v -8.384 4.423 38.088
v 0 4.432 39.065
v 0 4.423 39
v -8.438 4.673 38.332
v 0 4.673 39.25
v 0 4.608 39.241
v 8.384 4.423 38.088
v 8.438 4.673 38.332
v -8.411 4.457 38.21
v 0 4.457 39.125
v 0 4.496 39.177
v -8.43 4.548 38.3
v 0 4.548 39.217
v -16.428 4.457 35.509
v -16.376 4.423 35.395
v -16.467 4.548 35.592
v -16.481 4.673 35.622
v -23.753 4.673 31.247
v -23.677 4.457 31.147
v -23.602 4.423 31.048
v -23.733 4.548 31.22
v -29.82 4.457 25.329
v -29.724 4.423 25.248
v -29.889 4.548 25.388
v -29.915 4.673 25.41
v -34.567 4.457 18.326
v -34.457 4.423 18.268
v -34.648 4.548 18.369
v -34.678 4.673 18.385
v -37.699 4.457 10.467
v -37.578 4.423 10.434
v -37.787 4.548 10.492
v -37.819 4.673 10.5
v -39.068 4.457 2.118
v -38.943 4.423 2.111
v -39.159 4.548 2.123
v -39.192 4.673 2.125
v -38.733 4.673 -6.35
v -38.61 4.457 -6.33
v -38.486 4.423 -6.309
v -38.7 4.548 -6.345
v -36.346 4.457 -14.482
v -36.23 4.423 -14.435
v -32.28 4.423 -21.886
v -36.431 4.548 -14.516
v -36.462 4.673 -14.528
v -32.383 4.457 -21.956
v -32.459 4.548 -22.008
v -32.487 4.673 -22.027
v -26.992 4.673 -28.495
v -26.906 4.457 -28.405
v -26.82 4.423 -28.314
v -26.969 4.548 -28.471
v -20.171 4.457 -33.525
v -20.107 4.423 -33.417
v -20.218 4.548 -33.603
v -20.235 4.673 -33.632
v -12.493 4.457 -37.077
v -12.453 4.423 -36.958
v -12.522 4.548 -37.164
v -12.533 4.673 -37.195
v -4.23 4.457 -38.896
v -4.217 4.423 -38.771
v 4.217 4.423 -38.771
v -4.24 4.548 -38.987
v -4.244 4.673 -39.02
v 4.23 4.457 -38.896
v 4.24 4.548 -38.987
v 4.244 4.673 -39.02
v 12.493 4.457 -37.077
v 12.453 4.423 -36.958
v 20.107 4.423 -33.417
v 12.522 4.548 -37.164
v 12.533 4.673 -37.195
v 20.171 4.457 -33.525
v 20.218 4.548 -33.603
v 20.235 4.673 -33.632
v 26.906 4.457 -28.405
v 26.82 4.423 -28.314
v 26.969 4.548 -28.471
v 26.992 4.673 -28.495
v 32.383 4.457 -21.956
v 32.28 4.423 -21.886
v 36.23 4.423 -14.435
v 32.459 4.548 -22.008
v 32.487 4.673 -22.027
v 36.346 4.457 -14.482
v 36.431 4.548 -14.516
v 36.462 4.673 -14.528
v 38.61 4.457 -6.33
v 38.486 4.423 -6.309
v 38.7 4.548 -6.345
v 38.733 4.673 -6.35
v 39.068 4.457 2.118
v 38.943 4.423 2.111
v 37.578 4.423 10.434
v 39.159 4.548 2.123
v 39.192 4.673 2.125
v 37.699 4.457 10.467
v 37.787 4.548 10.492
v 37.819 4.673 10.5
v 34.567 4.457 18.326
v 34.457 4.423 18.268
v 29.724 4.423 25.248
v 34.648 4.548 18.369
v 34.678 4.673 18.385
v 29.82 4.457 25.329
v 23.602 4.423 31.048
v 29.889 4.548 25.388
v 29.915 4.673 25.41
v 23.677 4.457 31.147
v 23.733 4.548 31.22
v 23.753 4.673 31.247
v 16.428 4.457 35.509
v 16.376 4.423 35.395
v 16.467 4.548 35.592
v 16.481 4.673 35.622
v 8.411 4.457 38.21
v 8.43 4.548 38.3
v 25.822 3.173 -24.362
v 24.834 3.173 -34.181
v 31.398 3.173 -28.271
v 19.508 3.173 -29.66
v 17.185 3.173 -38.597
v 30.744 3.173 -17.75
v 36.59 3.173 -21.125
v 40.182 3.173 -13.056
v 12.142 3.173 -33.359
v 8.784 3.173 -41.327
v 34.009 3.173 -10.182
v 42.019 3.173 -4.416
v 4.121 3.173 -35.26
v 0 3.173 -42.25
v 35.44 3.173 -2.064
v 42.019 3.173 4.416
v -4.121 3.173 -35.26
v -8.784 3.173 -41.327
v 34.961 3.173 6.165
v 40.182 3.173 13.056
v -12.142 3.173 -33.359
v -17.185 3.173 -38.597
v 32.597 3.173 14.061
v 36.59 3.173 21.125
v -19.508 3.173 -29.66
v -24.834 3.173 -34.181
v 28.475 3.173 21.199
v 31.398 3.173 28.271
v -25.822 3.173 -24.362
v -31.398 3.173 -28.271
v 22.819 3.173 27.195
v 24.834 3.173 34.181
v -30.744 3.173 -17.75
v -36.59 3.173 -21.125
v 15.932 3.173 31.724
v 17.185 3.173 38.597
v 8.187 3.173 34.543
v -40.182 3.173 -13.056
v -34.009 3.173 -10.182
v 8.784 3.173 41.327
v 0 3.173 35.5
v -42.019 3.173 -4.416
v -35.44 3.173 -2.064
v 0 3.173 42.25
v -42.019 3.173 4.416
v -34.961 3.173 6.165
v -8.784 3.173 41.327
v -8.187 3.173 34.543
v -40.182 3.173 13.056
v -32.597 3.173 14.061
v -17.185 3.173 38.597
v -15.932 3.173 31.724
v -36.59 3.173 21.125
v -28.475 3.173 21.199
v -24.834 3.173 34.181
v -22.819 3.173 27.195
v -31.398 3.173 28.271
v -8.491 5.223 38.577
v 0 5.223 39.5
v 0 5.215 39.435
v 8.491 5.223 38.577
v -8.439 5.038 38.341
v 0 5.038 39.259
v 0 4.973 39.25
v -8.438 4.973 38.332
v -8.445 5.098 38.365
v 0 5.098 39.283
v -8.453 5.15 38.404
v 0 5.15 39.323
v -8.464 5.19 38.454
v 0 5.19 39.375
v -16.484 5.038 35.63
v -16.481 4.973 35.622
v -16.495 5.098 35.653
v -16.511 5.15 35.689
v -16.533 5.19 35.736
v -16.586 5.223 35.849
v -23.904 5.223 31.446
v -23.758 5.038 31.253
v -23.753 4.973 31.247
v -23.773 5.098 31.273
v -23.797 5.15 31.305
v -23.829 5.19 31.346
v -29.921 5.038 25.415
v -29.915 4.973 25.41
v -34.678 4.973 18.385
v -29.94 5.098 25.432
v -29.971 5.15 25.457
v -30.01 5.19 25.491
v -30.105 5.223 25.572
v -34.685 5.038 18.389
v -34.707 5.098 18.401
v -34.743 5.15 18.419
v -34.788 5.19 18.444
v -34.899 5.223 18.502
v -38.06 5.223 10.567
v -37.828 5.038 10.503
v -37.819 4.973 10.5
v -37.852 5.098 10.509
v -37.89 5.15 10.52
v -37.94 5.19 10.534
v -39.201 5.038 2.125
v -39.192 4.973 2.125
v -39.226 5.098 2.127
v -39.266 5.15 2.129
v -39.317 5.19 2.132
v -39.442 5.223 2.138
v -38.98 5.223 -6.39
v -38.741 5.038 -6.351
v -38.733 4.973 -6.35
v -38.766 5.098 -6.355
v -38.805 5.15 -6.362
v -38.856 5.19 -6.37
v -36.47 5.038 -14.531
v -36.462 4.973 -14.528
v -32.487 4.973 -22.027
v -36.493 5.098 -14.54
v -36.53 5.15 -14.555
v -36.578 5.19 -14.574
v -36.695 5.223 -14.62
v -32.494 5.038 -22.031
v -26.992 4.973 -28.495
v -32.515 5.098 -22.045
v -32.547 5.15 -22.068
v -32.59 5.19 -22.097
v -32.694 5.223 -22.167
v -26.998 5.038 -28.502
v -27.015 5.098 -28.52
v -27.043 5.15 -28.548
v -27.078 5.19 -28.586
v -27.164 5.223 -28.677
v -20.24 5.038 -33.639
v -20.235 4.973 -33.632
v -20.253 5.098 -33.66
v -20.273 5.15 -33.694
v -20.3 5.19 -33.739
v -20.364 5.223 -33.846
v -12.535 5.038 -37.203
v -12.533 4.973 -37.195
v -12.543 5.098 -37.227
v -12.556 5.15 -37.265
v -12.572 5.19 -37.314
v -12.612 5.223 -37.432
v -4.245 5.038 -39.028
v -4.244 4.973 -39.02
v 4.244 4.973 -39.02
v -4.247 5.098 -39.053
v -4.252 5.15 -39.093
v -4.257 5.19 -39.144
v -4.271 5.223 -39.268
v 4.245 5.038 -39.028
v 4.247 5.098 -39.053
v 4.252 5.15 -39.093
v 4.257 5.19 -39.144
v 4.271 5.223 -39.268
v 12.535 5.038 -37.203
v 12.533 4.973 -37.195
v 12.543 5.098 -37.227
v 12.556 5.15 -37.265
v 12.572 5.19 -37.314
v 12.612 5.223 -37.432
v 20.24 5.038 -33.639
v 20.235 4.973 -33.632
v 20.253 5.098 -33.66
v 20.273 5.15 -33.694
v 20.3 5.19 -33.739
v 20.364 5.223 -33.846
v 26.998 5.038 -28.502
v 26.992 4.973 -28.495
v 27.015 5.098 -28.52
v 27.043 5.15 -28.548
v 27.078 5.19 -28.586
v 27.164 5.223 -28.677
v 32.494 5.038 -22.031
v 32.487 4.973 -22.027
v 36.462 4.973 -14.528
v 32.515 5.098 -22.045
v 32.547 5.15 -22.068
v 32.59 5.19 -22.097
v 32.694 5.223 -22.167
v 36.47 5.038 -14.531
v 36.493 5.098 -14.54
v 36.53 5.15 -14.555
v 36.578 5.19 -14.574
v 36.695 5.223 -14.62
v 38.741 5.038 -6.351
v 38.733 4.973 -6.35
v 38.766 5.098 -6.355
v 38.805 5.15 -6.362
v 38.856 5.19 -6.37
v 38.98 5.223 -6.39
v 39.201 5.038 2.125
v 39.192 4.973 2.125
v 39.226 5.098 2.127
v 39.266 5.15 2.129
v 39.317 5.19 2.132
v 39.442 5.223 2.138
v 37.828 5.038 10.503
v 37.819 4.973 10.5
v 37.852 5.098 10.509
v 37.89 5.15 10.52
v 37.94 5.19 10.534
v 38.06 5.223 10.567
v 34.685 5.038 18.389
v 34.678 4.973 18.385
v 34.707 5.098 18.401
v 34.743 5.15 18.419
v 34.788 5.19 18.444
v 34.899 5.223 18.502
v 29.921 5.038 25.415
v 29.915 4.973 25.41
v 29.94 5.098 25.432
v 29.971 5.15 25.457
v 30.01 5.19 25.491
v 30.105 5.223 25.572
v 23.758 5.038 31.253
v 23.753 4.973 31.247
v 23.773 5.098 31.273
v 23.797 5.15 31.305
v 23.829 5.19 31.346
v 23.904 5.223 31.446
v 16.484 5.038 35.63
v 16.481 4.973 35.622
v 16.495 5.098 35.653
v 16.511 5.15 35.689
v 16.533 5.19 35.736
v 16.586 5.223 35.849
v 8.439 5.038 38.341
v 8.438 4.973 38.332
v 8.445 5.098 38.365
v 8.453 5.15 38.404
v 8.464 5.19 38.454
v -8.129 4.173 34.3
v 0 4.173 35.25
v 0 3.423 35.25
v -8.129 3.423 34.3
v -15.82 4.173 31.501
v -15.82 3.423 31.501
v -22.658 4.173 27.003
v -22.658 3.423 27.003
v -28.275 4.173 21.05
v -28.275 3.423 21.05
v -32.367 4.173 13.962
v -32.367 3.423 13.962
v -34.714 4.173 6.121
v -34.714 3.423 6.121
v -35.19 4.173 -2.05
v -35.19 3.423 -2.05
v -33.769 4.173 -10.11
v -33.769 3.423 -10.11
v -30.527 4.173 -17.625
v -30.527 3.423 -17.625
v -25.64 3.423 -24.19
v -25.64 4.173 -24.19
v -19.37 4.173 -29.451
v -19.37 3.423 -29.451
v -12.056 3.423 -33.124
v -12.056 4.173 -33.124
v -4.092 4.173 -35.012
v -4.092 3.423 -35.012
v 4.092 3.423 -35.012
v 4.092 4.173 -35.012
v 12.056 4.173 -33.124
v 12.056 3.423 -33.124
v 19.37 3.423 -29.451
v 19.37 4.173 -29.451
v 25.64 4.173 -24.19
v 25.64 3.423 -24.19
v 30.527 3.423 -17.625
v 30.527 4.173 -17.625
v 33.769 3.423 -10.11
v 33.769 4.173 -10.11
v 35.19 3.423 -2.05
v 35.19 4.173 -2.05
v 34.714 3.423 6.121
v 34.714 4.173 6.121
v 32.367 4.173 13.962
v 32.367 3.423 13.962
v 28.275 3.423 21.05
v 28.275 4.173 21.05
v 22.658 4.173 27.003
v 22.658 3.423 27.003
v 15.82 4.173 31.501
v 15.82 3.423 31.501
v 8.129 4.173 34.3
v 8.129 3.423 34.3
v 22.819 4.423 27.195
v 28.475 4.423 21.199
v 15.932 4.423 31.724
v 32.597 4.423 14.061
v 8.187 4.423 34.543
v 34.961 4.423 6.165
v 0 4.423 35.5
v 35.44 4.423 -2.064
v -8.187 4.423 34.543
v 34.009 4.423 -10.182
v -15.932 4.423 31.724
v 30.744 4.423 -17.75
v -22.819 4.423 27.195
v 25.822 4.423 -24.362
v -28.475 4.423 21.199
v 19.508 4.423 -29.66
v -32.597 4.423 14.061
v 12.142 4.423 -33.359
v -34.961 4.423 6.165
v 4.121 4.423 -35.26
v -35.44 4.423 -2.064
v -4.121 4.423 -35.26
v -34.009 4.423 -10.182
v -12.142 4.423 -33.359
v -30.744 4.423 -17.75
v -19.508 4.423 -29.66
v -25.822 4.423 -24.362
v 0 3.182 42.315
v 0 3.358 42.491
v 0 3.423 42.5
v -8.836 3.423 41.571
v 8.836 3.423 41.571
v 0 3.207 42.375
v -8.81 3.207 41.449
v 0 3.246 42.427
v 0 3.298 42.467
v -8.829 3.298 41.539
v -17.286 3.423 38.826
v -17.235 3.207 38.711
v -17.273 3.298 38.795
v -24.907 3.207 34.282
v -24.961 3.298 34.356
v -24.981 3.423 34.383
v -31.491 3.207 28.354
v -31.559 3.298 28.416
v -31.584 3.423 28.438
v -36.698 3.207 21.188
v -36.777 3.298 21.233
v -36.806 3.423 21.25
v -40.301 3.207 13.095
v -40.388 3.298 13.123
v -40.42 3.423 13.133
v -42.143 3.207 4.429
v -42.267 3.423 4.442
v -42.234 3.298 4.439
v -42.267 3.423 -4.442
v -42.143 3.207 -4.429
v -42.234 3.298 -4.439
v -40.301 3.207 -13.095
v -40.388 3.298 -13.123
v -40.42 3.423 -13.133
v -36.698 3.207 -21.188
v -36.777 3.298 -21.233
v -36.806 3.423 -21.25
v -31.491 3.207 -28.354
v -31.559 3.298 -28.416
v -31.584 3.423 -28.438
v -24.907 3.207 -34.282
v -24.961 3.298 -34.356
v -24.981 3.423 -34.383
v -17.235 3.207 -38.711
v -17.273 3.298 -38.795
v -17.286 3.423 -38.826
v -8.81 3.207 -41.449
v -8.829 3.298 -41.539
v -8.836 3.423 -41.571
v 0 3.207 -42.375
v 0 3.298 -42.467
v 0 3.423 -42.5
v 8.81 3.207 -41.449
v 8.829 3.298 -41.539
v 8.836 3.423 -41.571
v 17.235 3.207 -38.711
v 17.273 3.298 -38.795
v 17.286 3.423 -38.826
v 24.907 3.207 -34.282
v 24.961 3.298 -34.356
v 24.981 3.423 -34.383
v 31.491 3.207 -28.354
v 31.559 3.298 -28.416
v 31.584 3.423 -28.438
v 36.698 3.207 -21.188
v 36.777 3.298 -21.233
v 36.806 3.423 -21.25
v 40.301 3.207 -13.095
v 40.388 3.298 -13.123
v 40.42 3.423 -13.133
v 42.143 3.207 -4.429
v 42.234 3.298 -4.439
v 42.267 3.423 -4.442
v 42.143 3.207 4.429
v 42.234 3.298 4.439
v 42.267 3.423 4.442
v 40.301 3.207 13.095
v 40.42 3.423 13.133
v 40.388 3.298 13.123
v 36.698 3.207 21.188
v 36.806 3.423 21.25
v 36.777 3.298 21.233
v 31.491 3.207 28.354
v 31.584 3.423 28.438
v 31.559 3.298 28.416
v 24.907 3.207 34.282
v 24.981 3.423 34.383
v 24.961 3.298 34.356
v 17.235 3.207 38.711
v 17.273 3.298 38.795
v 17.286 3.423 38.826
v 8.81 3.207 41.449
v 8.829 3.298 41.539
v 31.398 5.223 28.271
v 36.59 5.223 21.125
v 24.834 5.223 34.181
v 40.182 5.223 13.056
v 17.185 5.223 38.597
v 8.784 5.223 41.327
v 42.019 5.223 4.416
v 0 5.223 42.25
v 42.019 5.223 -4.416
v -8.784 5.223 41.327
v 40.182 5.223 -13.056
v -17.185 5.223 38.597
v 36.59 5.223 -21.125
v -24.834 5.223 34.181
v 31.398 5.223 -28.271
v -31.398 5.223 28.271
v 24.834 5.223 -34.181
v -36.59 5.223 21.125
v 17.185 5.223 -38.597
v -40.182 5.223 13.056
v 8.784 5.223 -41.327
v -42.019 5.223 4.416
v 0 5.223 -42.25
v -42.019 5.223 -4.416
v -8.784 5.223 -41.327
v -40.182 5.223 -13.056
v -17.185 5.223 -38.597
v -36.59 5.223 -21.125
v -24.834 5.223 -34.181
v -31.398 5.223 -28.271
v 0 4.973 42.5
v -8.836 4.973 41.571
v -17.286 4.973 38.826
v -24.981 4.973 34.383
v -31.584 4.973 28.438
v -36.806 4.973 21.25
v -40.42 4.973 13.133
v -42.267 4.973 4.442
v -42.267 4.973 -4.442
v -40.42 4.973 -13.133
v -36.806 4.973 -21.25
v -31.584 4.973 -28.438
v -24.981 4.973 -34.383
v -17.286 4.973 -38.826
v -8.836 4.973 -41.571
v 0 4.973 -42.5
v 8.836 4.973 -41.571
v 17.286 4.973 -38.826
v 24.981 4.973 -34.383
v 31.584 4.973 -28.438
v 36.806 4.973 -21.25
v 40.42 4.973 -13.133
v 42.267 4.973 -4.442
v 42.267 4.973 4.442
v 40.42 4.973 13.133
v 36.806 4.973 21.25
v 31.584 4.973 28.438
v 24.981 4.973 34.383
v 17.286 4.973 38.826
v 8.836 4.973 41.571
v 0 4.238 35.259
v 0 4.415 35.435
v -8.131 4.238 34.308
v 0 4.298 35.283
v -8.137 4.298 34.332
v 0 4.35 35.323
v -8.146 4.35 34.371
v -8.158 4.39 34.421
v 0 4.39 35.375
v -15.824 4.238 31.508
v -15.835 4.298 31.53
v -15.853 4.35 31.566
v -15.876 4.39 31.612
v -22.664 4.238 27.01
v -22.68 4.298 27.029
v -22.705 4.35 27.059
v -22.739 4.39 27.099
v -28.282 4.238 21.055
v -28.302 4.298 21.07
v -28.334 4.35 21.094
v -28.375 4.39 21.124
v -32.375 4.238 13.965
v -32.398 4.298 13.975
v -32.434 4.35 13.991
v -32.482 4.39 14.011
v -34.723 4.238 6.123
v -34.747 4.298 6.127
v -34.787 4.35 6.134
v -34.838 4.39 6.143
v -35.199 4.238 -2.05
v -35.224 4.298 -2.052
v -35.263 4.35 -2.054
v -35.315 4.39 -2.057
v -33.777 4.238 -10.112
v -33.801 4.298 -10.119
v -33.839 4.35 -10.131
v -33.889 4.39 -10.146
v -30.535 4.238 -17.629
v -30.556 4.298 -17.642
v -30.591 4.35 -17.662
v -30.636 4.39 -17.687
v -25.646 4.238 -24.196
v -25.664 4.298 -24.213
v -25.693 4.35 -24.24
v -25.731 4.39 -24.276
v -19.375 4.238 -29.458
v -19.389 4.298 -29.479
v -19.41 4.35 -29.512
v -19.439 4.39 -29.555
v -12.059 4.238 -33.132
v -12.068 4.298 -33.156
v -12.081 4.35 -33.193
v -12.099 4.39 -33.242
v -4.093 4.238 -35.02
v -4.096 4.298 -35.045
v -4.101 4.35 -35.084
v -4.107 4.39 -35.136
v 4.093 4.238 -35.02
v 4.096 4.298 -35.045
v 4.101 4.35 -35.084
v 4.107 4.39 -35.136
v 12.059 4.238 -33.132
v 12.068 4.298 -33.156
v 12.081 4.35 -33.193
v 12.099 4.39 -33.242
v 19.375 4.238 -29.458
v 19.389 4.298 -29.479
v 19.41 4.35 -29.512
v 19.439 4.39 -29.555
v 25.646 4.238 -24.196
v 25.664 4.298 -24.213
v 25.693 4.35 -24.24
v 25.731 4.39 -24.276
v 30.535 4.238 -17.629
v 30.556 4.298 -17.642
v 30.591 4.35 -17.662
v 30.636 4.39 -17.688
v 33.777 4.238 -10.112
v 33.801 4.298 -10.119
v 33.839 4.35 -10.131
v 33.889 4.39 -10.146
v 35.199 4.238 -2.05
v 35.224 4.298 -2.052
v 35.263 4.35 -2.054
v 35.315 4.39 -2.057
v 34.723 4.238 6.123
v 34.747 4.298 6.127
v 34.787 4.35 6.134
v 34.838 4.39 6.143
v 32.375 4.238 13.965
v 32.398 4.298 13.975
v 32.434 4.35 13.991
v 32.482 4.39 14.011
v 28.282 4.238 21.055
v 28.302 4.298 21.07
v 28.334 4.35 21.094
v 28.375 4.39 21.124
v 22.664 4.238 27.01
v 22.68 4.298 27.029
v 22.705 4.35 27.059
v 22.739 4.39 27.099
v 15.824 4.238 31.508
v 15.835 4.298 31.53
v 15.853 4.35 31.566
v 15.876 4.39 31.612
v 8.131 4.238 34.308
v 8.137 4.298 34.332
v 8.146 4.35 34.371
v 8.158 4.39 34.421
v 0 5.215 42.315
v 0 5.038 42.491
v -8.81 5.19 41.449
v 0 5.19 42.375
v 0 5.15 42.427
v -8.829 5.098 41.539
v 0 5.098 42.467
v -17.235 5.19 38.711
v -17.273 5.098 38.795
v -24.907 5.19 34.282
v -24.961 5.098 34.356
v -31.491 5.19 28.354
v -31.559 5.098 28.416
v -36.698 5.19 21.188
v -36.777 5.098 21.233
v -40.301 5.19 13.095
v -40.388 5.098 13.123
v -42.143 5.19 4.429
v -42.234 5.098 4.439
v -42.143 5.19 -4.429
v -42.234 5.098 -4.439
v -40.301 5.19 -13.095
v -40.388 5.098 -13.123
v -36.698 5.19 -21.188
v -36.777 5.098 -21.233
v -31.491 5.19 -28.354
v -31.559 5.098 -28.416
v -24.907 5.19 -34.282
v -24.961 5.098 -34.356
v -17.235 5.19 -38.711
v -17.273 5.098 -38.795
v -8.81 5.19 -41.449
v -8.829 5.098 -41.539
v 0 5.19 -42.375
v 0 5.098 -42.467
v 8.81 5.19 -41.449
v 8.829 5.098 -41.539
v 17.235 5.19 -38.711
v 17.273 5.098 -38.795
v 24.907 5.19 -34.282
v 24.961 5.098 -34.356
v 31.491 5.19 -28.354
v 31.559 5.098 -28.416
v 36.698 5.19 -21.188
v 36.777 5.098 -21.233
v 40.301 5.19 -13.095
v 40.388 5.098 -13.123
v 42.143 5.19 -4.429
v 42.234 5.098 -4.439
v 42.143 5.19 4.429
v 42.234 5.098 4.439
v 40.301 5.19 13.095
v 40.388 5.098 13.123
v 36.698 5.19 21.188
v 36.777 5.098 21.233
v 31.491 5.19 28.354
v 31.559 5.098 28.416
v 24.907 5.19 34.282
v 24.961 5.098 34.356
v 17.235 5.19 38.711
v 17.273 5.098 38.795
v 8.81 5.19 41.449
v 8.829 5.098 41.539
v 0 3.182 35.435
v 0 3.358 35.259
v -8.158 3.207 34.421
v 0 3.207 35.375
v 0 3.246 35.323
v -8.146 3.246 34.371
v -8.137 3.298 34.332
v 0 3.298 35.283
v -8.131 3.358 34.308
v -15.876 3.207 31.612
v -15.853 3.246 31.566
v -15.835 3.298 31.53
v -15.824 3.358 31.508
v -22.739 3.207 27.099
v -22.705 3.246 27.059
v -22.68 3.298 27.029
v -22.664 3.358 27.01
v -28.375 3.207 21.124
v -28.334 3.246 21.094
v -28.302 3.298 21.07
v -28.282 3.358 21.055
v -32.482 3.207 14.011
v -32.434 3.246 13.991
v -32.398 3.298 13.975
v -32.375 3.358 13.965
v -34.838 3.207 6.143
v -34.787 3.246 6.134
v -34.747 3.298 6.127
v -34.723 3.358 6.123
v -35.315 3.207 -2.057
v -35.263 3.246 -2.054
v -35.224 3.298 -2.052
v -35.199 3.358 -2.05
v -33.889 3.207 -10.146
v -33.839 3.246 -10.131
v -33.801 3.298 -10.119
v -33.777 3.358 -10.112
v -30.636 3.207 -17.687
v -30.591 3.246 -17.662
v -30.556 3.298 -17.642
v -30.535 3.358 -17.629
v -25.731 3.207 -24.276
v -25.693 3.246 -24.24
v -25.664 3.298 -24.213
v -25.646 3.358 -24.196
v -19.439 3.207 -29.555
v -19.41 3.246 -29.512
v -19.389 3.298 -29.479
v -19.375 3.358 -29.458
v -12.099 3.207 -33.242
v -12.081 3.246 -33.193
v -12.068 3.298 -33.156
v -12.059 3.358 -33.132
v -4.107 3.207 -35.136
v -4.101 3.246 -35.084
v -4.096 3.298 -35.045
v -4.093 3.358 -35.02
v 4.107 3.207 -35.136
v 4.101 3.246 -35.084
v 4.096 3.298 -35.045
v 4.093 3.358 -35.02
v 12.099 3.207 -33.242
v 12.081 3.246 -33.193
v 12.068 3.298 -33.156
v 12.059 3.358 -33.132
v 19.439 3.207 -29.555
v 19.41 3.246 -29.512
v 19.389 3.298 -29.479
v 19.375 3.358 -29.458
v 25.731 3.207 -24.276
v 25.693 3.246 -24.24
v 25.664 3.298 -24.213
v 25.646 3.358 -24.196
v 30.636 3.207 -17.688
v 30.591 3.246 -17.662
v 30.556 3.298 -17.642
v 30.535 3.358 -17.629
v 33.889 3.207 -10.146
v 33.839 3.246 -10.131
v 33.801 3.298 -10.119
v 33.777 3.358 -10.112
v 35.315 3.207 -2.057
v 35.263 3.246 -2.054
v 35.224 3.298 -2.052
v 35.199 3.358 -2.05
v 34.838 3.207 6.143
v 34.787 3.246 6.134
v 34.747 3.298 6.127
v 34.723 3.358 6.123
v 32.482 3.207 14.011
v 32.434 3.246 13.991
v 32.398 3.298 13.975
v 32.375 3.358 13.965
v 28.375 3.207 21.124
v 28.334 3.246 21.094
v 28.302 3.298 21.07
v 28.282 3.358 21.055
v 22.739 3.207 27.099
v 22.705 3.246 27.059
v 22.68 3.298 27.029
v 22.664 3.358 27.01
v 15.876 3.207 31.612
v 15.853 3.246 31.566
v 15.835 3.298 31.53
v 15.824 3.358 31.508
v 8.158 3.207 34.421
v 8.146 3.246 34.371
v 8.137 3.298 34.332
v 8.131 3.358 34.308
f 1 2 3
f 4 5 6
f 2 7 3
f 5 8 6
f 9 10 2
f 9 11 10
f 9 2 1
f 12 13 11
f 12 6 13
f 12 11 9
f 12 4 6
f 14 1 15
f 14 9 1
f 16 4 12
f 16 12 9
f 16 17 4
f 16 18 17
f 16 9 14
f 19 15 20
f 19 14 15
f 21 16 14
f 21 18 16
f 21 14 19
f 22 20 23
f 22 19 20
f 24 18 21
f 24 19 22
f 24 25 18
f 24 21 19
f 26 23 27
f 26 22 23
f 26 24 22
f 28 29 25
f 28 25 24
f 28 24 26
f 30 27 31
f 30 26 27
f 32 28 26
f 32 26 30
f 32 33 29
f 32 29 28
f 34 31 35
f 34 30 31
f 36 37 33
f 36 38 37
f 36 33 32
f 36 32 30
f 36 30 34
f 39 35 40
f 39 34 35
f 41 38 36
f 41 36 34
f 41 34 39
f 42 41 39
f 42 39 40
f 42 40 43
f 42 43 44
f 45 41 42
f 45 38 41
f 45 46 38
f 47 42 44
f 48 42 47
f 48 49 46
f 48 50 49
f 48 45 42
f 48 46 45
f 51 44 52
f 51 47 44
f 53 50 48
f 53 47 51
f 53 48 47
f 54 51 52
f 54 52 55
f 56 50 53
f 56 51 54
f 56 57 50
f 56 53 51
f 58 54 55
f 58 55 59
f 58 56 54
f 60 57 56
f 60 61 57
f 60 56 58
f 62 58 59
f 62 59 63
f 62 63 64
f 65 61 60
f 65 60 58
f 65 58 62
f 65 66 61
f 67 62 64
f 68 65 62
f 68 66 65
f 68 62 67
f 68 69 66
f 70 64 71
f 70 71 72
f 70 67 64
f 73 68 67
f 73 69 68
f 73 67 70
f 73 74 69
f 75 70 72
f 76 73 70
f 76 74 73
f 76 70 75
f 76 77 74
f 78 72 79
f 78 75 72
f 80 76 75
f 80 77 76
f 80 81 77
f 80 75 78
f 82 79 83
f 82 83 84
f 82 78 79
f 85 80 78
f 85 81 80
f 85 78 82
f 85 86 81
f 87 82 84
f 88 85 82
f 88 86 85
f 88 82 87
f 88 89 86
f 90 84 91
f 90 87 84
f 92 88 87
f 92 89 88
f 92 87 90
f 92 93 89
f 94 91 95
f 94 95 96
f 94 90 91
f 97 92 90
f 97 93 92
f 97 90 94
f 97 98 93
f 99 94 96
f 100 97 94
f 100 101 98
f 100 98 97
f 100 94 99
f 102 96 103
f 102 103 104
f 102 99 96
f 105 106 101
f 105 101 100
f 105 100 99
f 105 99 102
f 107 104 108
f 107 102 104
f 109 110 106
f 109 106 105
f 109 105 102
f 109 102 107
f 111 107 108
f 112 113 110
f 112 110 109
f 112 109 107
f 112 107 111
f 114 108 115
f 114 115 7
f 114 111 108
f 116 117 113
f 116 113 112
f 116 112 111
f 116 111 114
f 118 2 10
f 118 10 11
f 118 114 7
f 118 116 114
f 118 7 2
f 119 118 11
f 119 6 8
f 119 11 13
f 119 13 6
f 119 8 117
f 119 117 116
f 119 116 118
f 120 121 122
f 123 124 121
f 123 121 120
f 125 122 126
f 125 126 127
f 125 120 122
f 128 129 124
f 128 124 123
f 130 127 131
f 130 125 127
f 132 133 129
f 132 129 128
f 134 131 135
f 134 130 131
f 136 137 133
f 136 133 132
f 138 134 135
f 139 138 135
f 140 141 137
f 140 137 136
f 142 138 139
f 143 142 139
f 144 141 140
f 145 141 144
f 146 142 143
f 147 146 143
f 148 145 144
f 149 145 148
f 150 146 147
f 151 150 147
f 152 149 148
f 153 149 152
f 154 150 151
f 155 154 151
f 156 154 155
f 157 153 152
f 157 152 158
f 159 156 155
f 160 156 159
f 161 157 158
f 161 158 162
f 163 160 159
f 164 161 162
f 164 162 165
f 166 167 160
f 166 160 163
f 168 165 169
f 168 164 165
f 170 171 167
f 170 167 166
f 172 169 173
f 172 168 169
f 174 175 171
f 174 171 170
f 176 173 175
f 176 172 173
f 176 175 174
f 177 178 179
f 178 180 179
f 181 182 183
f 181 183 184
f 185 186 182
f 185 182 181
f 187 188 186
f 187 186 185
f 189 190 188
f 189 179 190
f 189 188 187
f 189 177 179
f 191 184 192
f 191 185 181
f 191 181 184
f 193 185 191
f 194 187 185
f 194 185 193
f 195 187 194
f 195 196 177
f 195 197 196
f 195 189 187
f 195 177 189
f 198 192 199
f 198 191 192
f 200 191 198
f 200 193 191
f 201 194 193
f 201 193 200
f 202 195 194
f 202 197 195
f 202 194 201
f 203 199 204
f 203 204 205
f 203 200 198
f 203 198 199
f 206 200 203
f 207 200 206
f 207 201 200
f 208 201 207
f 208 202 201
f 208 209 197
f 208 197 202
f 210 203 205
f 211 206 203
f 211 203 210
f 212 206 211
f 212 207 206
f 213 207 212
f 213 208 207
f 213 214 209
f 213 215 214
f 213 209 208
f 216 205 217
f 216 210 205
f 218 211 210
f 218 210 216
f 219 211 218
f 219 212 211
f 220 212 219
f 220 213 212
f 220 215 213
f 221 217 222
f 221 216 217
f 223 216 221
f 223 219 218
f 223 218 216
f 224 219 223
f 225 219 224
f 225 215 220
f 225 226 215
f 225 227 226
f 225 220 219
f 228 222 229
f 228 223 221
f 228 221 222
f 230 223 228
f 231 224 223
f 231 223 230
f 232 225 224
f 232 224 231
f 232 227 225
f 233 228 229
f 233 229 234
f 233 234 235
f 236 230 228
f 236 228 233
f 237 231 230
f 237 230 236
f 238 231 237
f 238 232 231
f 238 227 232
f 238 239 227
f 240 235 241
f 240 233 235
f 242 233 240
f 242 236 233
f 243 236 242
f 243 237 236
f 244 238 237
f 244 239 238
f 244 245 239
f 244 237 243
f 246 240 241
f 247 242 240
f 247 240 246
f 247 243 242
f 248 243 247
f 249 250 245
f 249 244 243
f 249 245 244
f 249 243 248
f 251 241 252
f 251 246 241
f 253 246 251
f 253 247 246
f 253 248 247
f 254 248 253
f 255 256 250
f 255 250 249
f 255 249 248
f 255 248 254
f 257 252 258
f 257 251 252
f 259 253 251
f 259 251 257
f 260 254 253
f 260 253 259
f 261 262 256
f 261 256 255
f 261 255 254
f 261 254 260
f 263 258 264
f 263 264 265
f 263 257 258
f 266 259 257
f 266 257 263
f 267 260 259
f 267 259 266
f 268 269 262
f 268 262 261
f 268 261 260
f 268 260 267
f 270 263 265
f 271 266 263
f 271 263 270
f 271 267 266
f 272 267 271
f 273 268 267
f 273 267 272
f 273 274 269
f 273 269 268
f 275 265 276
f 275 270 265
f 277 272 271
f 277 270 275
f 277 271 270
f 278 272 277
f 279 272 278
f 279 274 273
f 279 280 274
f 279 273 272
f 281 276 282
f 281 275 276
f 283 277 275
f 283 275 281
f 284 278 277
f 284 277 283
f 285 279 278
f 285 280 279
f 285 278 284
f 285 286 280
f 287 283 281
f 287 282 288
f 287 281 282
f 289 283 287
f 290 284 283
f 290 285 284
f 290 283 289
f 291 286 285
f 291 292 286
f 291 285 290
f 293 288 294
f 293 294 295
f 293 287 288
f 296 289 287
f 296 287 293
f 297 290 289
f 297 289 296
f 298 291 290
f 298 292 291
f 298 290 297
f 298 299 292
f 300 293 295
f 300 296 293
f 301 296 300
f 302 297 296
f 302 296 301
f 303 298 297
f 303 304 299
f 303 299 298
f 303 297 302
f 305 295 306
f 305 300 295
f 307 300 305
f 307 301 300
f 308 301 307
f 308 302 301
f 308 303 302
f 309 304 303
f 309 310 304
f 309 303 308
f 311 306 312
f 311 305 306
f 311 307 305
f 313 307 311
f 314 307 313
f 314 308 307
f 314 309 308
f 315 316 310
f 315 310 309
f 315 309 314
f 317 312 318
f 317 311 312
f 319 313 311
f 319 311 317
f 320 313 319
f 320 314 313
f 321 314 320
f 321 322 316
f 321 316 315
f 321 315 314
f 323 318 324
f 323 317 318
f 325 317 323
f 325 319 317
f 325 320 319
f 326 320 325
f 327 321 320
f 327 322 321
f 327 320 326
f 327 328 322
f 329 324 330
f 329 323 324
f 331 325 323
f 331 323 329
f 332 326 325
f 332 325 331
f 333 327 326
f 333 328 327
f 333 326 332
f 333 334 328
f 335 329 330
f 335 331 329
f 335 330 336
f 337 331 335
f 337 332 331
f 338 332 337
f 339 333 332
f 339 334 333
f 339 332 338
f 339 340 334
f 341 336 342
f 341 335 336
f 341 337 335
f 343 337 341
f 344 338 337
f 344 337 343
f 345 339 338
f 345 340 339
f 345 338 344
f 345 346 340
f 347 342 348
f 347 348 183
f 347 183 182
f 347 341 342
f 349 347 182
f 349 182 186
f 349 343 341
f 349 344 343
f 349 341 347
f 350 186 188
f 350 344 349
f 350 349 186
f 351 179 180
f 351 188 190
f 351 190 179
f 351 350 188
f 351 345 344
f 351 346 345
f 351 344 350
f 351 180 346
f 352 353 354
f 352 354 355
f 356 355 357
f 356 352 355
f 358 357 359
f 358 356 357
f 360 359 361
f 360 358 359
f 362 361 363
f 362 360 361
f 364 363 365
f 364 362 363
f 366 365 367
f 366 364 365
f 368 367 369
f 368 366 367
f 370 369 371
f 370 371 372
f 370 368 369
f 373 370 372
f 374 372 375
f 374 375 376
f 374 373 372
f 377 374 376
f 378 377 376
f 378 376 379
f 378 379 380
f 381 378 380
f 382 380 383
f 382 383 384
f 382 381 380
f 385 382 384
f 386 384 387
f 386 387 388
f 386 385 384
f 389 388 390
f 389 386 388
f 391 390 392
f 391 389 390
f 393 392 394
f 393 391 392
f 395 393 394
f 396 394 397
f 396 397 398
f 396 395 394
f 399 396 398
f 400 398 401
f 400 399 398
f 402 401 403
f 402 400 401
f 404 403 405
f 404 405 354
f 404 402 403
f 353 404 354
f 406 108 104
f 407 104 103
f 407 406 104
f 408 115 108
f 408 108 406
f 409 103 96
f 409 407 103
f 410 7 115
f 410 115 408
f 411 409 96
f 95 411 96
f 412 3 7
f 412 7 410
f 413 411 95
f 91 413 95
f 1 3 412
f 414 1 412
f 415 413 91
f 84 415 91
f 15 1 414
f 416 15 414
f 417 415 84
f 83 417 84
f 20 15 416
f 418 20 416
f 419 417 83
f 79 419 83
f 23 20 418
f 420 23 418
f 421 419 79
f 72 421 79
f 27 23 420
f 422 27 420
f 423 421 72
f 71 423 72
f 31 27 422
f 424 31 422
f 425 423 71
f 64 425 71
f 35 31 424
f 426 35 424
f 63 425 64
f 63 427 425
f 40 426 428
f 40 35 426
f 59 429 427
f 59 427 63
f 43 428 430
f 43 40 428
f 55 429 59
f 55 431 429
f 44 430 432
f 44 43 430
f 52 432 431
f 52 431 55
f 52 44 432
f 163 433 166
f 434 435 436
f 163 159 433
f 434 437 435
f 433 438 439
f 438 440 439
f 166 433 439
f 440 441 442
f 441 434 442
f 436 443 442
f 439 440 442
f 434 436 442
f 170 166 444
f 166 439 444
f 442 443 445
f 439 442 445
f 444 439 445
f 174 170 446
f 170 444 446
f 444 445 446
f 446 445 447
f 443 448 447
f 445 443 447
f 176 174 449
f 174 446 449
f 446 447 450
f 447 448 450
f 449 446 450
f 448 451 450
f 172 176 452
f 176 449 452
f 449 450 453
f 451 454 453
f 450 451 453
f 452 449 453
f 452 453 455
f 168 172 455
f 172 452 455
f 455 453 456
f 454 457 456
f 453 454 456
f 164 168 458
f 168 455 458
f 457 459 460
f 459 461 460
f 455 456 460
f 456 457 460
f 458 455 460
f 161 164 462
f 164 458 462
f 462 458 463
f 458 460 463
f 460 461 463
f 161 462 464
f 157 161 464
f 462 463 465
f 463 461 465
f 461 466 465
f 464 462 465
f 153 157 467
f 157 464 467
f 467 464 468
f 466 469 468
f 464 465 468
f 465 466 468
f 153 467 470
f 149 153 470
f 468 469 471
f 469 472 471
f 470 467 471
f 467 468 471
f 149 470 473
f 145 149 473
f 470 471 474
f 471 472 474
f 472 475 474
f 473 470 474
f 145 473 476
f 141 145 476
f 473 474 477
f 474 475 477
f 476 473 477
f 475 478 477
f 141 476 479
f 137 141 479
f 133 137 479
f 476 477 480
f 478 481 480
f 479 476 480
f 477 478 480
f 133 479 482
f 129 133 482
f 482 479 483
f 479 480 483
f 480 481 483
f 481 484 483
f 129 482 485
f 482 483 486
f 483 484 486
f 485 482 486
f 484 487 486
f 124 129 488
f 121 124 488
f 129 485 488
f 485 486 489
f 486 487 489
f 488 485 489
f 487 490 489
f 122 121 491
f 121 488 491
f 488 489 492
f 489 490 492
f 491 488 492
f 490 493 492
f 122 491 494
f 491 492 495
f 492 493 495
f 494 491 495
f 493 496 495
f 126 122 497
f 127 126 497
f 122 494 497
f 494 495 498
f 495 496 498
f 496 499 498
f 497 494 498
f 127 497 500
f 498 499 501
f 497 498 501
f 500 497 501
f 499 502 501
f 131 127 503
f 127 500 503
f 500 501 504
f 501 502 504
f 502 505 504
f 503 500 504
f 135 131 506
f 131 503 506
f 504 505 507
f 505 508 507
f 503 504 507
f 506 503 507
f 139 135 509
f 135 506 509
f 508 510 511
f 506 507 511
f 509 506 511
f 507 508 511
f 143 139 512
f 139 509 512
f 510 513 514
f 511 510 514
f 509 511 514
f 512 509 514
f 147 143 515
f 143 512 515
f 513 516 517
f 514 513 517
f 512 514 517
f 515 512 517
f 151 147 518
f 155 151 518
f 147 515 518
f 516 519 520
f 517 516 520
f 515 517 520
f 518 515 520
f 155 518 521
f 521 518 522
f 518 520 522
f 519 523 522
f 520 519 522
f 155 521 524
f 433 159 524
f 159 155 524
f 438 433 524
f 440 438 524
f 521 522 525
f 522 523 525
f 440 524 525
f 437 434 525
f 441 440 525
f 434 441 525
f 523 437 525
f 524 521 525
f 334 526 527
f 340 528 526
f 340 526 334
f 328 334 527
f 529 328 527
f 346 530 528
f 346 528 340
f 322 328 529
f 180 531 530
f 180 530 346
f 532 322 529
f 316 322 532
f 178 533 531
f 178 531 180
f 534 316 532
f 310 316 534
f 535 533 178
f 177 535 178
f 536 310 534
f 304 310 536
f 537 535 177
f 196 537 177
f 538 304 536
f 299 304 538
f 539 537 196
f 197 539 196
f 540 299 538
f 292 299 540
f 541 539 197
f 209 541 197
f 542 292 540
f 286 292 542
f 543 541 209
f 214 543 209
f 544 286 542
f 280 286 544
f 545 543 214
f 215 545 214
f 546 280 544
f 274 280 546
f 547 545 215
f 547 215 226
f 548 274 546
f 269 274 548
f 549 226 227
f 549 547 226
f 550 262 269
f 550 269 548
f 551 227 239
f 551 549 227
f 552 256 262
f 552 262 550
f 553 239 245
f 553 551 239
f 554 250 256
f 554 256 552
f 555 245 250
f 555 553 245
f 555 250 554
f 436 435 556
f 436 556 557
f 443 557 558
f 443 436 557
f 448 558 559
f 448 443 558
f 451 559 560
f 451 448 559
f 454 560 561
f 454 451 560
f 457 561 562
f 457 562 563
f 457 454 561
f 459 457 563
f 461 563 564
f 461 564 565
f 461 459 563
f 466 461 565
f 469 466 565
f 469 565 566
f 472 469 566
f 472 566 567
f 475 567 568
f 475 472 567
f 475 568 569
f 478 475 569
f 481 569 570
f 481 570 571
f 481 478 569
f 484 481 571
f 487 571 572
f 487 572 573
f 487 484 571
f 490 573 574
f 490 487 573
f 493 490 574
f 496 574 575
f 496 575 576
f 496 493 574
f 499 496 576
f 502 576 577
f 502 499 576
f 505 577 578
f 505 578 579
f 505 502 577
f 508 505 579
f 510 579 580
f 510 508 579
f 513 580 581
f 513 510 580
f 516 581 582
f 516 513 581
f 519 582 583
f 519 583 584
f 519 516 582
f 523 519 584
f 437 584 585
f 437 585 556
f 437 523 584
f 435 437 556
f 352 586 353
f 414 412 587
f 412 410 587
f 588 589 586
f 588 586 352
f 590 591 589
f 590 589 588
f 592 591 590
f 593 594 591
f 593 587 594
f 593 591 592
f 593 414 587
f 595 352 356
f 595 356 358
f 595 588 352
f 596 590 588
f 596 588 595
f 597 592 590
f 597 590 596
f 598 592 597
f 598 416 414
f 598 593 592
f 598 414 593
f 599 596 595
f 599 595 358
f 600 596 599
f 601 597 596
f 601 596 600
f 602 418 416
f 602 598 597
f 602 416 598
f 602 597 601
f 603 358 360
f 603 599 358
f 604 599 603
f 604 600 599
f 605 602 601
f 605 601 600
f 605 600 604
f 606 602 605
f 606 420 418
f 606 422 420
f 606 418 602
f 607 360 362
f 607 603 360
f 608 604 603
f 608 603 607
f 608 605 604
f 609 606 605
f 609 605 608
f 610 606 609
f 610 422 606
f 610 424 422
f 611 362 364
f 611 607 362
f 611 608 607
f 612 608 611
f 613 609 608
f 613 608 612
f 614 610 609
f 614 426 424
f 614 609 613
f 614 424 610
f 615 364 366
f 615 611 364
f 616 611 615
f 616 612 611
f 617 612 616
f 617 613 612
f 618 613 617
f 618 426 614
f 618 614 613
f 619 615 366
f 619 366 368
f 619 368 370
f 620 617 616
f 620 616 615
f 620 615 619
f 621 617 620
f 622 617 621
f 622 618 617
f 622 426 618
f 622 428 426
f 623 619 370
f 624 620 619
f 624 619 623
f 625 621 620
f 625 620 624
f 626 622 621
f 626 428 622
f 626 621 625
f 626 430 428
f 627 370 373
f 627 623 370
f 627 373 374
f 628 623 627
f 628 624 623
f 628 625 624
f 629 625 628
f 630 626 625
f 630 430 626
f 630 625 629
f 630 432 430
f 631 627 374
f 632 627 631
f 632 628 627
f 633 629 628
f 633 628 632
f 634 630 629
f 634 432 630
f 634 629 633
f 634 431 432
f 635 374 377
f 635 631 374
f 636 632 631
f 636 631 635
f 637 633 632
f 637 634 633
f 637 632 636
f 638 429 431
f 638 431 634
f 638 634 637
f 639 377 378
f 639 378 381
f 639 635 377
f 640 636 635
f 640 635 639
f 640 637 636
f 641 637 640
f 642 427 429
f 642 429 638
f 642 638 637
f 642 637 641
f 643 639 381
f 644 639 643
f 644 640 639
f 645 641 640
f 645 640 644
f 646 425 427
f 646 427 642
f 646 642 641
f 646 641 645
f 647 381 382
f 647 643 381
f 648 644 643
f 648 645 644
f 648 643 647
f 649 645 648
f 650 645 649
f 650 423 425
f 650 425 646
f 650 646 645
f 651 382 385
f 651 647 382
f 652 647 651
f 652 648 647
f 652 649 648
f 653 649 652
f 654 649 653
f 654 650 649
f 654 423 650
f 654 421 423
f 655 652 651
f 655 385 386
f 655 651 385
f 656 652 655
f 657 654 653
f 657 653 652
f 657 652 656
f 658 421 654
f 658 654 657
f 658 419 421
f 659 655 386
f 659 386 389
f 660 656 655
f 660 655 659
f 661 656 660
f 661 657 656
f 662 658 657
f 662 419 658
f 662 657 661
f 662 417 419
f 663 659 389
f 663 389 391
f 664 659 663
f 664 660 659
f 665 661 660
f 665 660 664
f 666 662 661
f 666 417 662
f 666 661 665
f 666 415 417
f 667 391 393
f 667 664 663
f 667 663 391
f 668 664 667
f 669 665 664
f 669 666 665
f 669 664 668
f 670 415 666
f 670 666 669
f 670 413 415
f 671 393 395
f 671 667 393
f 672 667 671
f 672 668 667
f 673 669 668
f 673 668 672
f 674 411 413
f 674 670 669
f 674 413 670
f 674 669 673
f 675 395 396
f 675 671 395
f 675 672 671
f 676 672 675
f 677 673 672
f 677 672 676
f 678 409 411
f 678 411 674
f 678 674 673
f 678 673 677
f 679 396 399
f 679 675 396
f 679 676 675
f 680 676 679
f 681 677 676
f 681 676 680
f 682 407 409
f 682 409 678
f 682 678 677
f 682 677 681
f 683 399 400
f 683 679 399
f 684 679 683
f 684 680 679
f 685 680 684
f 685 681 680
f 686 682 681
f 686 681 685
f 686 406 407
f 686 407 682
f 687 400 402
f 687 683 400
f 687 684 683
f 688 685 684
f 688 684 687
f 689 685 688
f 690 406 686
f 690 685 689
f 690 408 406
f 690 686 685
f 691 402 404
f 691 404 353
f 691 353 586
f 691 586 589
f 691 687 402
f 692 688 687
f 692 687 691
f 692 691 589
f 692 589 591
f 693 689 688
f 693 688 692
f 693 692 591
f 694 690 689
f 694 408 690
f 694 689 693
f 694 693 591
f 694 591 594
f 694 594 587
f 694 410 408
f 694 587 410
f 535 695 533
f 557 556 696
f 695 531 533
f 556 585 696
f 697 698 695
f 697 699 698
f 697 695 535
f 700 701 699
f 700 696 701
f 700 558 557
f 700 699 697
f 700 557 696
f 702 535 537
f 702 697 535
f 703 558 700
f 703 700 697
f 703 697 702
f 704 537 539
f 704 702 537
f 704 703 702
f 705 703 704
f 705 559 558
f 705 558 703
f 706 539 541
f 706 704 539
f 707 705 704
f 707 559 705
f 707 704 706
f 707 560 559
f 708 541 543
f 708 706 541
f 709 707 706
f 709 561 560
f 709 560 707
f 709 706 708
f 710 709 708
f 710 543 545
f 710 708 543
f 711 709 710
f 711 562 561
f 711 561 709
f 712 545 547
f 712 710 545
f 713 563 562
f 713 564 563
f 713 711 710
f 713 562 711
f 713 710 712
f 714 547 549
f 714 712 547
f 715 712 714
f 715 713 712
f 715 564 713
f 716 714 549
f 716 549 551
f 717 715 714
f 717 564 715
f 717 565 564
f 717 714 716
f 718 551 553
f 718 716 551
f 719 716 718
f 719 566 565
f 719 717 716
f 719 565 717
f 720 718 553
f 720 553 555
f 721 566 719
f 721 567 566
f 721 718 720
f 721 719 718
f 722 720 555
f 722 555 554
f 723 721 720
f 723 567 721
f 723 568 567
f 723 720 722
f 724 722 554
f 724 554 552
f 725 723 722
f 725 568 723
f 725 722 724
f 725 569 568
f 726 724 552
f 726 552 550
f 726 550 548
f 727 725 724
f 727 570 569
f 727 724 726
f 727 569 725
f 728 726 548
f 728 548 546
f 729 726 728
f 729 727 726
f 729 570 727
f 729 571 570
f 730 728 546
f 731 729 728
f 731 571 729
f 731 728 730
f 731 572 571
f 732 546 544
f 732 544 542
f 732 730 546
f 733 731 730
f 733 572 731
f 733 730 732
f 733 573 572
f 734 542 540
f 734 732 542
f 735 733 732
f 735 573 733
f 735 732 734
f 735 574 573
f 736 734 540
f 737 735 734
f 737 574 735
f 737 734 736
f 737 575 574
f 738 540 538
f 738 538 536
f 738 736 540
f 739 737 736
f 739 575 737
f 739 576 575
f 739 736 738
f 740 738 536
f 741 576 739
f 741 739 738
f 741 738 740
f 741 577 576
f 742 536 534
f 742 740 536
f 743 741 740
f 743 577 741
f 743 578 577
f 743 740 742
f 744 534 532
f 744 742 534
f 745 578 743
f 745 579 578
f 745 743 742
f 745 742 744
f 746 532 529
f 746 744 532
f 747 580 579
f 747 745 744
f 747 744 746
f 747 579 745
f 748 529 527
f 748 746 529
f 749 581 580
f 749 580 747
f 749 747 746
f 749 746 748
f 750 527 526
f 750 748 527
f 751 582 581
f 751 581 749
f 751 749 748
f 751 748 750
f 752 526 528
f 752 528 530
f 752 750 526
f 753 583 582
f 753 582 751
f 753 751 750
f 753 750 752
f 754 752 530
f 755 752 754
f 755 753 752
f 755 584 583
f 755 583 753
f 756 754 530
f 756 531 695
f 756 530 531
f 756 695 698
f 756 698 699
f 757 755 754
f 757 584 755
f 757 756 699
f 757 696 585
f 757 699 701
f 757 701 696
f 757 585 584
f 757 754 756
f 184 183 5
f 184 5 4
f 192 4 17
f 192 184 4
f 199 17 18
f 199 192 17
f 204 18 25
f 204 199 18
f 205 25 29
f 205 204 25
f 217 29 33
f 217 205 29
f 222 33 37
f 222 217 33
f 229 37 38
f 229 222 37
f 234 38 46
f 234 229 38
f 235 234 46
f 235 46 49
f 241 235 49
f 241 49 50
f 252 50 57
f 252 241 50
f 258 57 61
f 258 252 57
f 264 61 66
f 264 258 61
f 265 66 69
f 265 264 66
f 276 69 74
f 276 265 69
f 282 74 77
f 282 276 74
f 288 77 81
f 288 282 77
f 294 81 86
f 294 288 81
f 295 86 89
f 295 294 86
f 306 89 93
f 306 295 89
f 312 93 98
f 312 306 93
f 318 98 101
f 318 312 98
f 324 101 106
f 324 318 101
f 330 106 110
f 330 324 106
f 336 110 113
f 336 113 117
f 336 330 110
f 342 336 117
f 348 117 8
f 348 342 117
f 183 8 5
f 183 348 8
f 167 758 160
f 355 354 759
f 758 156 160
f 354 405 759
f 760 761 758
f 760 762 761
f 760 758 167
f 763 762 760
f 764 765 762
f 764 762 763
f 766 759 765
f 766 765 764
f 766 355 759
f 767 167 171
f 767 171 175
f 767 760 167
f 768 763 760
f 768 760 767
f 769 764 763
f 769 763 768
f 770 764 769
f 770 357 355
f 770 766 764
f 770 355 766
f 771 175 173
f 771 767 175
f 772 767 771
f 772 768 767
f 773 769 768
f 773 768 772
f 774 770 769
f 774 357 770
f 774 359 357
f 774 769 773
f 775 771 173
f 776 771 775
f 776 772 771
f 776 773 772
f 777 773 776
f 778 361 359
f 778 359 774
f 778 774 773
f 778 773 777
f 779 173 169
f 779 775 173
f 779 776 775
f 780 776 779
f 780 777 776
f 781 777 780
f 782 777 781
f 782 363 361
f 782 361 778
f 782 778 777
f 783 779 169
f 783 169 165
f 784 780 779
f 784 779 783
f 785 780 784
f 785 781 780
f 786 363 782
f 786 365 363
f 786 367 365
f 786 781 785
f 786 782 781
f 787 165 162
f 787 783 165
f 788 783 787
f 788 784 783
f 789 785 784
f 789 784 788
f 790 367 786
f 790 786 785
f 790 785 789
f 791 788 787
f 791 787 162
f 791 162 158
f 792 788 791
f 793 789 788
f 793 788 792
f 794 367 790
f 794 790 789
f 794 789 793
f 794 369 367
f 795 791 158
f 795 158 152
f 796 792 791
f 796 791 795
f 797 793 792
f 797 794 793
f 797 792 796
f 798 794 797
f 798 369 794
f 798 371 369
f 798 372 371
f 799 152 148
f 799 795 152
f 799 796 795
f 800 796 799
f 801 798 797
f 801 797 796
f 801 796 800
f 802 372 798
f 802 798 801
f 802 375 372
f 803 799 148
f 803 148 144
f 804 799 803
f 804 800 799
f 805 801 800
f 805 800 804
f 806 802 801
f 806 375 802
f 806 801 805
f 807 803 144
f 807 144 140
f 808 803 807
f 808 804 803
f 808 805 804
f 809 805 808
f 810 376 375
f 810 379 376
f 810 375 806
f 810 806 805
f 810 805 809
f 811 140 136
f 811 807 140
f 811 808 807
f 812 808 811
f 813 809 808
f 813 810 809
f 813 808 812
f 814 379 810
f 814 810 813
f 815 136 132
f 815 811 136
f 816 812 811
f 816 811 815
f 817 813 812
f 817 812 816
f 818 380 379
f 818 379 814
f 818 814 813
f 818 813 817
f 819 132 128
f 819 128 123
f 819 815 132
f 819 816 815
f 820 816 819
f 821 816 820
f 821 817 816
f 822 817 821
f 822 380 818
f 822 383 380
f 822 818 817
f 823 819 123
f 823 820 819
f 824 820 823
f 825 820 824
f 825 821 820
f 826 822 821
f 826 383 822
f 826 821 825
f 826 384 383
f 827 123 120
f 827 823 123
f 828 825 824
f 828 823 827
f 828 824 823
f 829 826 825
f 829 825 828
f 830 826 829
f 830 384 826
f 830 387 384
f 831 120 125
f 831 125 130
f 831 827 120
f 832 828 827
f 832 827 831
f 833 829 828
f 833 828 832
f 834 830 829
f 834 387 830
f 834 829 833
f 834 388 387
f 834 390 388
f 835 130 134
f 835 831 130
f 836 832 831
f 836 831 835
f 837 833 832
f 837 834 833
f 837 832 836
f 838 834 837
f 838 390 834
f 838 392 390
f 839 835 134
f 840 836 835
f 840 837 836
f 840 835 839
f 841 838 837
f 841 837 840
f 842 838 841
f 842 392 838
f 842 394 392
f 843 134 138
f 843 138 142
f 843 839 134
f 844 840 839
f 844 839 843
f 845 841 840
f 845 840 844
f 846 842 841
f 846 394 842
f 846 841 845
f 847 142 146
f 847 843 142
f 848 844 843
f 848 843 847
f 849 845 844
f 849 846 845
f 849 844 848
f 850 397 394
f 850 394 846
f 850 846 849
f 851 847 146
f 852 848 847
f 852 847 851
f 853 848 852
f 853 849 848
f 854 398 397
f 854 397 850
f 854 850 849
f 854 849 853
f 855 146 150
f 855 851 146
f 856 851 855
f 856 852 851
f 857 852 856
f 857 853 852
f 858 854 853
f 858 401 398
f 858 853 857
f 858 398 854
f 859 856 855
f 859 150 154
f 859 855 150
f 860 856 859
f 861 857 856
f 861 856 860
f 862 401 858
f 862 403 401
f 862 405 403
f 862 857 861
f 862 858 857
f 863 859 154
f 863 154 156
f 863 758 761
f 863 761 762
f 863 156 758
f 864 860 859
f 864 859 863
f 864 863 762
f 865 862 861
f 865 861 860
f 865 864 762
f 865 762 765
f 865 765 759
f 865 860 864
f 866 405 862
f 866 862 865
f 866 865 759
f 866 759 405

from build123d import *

# Parameters (mm, degrees)
FILETE1_R = 0.25


with BuildPart() as part:
    # Esboço1 → Revolução1 (revolve)
    with BuildSketch(Plane.XY):
        Polygon((35.25, 4.423200443), (35.25, 3.173200443), (42.5, 3.173200443), (42.5, 5.223200443), (39.25, 5.223200443), (39.25, 4.423200443), align=None)
    revolve(axis=Axis((0, 47.220653378, 0), (0, -1, 0)))

    # Filete1
    filete1_edges = [part.edges().sort_by_distance(p)[0] for p in [
        (-42.5, 3.173200443, 0),
        (-42.5, 5.223200443, 0),
        (-39.25, 5.223200443, 0),
        (-39.25, 4.423200443, 0),
        (-35.25, 4.423200443, 0),
        (-35.25, 3.173200443, 0),
    ]]
    fillet(filete1_edges, radius=FILETE1_R)


solid = part.part
